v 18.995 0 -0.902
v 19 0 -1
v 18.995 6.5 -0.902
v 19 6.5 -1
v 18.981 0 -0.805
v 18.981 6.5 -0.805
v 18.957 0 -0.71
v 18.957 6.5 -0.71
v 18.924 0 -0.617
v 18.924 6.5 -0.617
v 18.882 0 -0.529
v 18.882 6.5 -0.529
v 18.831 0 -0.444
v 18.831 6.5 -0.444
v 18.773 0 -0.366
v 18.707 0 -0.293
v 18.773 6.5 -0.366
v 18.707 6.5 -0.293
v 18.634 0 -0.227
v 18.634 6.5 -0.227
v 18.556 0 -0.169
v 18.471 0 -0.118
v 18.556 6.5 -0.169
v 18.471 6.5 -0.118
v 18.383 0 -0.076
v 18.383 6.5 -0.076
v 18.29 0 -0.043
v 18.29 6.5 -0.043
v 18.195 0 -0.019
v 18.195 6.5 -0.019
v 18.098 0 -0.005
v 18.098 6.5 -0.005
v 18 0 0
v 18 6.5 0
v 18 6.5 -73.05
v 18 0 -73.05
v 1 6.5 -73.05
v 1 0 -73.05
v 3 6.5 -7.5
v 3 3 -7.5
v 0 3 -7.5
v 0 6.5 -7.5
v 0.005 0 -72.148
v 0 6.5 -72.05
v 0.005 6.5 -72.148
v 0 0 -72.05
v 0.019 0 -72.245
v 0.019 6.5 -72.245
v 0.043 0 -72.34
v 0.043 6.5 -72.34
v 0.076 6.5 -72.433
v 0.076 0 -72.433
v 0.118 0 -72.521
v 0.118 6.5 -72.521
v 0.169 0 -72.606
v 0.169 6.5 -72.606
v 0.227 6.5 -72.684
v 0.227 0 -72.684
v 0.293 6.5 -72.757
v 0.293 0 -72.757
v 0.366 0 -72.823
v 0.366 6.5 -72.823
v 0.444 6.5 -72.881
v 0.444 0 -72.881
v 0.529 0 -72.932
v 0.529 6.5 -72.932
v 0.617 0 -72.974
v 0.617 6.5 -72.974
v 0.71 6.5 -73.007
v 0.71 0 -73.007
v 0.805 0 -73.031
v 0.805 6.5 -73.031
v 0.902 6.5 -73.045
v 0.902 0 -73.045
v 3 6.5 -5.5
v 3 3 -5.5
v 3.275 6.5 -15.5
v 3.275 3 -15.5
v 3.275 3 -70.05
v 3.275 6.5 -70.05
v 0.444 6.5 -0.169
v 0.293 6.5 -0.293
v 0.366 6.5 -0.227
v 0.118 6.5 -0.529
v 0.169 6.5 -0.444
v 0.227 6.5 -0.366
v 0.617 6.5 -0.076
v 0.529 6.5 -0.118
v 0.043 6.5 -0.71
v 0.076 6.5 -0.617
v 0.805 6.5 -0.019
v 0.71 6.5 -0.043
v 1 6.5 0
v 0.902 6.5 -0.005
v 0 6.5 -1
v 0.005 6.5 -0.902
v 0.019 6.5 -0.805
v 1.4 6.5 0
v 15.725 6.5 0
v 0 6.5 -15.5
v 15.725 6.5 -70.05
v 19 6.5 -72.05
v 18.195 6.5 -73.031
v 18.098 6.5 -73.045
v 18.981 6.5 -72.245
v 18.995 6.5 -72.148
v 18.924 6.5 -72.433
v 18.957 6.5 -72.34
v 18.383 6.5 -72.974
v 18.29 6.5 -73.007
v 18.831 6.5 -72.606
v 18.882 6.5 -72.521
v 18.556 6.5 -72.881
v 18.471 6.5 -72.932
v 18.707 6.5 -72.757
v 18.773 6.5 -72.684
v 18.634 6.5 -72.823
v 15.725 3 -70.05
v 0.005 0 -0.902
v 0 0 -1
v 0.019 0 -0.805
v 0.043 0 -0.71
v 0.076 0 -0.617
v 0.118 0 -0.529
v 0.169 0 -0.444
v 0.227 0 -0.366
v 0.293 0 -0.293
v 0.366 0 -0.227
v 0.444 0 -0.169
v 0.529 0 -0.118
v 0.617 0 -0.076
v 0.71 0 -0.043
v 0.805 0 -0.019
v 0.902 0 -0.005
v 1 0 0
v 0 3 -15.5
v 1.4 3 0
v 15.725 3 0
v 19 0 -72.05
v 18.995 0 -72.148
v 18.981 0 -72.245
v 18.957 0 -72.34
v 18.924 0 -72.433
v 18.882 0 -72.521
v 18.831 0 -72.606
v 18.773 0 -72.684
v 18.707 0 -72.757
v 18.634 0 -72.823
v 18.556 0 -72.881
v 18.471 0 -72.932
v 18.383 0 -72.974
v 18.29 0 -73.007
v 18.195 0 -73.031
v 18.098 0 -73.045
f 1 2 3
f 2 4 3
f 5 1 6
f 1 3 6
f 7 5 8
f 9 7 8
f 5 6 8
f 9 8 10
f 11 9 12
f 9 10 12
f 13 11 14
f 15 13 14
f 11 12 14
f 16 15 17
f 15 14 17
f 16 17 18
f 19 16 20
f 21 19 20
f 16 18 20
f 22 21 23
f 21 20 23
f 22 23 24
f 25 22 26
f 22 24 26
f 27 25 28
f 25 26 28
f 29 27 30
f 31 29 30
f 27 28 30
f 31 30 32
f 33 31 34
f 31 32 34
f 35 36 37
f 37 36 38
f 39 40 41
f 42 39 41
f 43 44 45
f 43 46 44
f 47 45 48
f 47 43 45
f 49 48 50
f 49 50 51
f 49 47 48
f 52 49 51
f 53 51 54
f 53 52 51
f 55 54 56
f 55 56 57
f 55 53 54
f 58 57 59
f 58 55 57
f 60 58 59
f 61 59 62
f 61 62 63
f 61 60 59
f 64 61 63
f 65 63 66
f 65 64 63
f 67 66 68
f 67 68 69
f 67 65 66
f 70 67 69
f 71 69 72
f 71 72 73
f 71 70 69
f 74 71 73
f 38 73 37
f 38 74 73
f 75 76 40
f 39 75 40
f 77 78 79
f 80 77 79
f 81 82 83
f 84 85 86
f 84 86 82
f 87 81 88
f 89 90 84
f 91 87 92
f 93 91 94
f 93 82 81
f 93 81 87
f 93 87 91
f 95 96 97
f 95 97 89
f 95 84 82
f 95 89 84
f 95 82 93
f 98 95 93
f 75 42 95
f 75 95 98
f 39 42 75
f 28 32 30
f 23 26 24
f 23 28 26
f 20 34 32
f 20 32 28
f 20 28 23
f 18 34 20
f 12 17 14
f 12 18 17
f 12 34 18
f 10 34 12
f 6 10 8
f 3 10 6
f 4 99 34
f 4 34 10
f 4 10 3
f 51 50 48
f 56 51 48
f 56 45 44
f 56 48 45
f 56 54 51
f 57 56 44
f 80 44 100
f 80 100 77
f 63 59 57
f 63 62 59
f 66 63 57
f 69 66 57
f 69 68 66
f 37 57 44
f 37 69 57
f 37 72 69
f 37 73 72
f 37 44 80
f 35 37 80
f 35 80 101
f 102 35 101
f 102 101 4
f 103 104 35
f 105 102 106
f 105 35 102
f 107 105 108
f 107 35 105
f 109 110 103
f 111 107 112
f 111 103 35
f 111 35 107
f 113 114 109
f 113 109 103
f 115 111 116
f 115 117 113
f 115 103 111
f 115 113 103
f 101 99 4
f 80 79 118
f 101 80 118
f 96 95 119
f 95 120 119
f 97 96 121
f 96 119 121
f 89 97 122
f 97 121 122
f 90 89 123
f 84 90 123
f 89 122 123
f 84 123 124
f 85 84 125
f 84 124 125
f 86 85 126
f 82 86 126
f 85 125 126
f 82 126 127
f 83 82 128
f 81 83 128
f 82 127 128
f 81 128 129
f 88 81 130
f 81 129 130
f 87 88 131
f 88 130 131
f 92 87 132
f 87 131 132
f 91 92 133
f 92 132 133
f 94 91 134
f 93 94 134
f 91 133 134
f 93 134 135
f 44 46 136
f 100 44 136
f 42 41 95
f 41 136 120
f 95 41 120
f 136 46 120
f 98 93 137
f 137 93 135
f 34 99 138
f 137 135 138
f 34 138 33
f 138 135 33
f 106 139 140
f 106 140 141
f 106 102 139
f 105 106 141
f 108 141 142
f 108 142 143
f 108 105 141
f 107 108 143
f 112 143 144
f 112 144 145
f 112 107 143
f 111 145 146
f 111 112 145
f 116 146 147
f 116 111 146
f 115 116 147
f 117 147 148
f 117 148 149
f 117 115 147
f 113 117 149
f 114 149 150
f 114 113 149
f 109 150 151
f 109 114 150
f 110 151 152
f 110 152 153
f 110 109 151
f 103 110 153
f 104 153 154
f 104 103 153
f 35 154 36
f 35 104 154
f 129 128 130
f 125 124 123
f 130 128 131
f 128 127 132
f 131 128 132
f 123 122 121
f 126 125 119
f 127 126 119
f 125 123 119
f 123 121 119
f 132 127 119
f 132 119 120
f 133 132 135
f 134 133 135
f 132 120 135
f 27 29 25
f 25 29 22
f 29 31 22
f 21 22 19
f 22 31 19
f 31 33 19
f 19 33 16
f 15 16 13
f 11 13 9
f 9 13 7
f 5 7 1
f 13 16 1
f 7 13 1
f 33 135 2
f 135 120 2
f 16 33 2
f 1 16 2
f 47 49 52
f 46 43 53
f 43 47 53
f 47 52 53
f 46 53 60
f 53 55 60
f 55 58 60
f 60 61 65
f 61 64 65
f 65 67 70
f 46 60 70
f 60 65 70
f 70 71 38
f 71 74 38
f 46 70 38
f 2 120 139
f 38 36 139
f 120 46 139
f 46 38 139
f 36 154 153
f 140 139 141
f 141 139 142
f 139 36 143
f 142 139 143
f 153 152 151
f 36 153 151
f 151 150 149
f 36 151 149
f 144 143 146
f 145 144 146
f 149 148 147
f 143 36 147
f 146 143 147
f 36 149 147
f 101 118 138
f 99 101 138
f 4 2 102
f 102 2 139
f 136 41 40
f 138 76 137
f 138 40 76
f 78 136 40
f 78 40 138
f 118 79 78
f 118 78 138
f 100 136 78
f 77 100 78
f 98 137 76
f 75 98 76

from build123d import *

# Parameters (mm, degrees)
EXTRUDE_1_DEPTH = 3
EXTRUDE_2_DEPTH = 3.5
FILLET_3_R      = 1


with BuildPart() as part:
    # ｽｹｯﾁ1 → ﾎﾞｽ - 押し出し1 (new body)
    with BuildSketch(Plane(origin=(0, 0, 0), x_dir=(1, 0, 0), z_dir=(0, 1, 0))):
        Polygon((0, 0), (7, 0), (12, 0), (19, 0), (19, 73.05), (0, 73.05), align=None)
    extrude(amount=EXTRUDE_1_DEPTH)

    # ｽｹｯﾁ2 → ﾎﾞｽ - 押し出し2 (add)
    with BuildSketch(Plane(origin=(0, 3, 0), x_dir=(1, 0, 0), z_dir=(0, 1, 0))):
        Polygon((1.4, 0), (3, 5.5), (3, 7.5), (0, 7.5), (0, 0), align=None)
        Polygon((0, 15.5), (3.275, 15.5), (3.275, 70.05), (15.725, 70.05), (15.725, 0), (19, 0), (19, 73.05), (0, 73.05), align=None)
    extrude(amount=EXTRUDE_2_DEPTH)

    # ﾌｨﾚｯﾄ3
    fillet_3_edges = [part.edges().sort_by_distance(p)[0] for p in [
        (0, 3.25, -73.05),
        (19, 3.25, -73.05),
        (19, 3.25, 0),
        (0, 3.25, 0),
    ]]
    fillet(fillet_3_edges, radius=FILLET_3_R)


solid = part.part
